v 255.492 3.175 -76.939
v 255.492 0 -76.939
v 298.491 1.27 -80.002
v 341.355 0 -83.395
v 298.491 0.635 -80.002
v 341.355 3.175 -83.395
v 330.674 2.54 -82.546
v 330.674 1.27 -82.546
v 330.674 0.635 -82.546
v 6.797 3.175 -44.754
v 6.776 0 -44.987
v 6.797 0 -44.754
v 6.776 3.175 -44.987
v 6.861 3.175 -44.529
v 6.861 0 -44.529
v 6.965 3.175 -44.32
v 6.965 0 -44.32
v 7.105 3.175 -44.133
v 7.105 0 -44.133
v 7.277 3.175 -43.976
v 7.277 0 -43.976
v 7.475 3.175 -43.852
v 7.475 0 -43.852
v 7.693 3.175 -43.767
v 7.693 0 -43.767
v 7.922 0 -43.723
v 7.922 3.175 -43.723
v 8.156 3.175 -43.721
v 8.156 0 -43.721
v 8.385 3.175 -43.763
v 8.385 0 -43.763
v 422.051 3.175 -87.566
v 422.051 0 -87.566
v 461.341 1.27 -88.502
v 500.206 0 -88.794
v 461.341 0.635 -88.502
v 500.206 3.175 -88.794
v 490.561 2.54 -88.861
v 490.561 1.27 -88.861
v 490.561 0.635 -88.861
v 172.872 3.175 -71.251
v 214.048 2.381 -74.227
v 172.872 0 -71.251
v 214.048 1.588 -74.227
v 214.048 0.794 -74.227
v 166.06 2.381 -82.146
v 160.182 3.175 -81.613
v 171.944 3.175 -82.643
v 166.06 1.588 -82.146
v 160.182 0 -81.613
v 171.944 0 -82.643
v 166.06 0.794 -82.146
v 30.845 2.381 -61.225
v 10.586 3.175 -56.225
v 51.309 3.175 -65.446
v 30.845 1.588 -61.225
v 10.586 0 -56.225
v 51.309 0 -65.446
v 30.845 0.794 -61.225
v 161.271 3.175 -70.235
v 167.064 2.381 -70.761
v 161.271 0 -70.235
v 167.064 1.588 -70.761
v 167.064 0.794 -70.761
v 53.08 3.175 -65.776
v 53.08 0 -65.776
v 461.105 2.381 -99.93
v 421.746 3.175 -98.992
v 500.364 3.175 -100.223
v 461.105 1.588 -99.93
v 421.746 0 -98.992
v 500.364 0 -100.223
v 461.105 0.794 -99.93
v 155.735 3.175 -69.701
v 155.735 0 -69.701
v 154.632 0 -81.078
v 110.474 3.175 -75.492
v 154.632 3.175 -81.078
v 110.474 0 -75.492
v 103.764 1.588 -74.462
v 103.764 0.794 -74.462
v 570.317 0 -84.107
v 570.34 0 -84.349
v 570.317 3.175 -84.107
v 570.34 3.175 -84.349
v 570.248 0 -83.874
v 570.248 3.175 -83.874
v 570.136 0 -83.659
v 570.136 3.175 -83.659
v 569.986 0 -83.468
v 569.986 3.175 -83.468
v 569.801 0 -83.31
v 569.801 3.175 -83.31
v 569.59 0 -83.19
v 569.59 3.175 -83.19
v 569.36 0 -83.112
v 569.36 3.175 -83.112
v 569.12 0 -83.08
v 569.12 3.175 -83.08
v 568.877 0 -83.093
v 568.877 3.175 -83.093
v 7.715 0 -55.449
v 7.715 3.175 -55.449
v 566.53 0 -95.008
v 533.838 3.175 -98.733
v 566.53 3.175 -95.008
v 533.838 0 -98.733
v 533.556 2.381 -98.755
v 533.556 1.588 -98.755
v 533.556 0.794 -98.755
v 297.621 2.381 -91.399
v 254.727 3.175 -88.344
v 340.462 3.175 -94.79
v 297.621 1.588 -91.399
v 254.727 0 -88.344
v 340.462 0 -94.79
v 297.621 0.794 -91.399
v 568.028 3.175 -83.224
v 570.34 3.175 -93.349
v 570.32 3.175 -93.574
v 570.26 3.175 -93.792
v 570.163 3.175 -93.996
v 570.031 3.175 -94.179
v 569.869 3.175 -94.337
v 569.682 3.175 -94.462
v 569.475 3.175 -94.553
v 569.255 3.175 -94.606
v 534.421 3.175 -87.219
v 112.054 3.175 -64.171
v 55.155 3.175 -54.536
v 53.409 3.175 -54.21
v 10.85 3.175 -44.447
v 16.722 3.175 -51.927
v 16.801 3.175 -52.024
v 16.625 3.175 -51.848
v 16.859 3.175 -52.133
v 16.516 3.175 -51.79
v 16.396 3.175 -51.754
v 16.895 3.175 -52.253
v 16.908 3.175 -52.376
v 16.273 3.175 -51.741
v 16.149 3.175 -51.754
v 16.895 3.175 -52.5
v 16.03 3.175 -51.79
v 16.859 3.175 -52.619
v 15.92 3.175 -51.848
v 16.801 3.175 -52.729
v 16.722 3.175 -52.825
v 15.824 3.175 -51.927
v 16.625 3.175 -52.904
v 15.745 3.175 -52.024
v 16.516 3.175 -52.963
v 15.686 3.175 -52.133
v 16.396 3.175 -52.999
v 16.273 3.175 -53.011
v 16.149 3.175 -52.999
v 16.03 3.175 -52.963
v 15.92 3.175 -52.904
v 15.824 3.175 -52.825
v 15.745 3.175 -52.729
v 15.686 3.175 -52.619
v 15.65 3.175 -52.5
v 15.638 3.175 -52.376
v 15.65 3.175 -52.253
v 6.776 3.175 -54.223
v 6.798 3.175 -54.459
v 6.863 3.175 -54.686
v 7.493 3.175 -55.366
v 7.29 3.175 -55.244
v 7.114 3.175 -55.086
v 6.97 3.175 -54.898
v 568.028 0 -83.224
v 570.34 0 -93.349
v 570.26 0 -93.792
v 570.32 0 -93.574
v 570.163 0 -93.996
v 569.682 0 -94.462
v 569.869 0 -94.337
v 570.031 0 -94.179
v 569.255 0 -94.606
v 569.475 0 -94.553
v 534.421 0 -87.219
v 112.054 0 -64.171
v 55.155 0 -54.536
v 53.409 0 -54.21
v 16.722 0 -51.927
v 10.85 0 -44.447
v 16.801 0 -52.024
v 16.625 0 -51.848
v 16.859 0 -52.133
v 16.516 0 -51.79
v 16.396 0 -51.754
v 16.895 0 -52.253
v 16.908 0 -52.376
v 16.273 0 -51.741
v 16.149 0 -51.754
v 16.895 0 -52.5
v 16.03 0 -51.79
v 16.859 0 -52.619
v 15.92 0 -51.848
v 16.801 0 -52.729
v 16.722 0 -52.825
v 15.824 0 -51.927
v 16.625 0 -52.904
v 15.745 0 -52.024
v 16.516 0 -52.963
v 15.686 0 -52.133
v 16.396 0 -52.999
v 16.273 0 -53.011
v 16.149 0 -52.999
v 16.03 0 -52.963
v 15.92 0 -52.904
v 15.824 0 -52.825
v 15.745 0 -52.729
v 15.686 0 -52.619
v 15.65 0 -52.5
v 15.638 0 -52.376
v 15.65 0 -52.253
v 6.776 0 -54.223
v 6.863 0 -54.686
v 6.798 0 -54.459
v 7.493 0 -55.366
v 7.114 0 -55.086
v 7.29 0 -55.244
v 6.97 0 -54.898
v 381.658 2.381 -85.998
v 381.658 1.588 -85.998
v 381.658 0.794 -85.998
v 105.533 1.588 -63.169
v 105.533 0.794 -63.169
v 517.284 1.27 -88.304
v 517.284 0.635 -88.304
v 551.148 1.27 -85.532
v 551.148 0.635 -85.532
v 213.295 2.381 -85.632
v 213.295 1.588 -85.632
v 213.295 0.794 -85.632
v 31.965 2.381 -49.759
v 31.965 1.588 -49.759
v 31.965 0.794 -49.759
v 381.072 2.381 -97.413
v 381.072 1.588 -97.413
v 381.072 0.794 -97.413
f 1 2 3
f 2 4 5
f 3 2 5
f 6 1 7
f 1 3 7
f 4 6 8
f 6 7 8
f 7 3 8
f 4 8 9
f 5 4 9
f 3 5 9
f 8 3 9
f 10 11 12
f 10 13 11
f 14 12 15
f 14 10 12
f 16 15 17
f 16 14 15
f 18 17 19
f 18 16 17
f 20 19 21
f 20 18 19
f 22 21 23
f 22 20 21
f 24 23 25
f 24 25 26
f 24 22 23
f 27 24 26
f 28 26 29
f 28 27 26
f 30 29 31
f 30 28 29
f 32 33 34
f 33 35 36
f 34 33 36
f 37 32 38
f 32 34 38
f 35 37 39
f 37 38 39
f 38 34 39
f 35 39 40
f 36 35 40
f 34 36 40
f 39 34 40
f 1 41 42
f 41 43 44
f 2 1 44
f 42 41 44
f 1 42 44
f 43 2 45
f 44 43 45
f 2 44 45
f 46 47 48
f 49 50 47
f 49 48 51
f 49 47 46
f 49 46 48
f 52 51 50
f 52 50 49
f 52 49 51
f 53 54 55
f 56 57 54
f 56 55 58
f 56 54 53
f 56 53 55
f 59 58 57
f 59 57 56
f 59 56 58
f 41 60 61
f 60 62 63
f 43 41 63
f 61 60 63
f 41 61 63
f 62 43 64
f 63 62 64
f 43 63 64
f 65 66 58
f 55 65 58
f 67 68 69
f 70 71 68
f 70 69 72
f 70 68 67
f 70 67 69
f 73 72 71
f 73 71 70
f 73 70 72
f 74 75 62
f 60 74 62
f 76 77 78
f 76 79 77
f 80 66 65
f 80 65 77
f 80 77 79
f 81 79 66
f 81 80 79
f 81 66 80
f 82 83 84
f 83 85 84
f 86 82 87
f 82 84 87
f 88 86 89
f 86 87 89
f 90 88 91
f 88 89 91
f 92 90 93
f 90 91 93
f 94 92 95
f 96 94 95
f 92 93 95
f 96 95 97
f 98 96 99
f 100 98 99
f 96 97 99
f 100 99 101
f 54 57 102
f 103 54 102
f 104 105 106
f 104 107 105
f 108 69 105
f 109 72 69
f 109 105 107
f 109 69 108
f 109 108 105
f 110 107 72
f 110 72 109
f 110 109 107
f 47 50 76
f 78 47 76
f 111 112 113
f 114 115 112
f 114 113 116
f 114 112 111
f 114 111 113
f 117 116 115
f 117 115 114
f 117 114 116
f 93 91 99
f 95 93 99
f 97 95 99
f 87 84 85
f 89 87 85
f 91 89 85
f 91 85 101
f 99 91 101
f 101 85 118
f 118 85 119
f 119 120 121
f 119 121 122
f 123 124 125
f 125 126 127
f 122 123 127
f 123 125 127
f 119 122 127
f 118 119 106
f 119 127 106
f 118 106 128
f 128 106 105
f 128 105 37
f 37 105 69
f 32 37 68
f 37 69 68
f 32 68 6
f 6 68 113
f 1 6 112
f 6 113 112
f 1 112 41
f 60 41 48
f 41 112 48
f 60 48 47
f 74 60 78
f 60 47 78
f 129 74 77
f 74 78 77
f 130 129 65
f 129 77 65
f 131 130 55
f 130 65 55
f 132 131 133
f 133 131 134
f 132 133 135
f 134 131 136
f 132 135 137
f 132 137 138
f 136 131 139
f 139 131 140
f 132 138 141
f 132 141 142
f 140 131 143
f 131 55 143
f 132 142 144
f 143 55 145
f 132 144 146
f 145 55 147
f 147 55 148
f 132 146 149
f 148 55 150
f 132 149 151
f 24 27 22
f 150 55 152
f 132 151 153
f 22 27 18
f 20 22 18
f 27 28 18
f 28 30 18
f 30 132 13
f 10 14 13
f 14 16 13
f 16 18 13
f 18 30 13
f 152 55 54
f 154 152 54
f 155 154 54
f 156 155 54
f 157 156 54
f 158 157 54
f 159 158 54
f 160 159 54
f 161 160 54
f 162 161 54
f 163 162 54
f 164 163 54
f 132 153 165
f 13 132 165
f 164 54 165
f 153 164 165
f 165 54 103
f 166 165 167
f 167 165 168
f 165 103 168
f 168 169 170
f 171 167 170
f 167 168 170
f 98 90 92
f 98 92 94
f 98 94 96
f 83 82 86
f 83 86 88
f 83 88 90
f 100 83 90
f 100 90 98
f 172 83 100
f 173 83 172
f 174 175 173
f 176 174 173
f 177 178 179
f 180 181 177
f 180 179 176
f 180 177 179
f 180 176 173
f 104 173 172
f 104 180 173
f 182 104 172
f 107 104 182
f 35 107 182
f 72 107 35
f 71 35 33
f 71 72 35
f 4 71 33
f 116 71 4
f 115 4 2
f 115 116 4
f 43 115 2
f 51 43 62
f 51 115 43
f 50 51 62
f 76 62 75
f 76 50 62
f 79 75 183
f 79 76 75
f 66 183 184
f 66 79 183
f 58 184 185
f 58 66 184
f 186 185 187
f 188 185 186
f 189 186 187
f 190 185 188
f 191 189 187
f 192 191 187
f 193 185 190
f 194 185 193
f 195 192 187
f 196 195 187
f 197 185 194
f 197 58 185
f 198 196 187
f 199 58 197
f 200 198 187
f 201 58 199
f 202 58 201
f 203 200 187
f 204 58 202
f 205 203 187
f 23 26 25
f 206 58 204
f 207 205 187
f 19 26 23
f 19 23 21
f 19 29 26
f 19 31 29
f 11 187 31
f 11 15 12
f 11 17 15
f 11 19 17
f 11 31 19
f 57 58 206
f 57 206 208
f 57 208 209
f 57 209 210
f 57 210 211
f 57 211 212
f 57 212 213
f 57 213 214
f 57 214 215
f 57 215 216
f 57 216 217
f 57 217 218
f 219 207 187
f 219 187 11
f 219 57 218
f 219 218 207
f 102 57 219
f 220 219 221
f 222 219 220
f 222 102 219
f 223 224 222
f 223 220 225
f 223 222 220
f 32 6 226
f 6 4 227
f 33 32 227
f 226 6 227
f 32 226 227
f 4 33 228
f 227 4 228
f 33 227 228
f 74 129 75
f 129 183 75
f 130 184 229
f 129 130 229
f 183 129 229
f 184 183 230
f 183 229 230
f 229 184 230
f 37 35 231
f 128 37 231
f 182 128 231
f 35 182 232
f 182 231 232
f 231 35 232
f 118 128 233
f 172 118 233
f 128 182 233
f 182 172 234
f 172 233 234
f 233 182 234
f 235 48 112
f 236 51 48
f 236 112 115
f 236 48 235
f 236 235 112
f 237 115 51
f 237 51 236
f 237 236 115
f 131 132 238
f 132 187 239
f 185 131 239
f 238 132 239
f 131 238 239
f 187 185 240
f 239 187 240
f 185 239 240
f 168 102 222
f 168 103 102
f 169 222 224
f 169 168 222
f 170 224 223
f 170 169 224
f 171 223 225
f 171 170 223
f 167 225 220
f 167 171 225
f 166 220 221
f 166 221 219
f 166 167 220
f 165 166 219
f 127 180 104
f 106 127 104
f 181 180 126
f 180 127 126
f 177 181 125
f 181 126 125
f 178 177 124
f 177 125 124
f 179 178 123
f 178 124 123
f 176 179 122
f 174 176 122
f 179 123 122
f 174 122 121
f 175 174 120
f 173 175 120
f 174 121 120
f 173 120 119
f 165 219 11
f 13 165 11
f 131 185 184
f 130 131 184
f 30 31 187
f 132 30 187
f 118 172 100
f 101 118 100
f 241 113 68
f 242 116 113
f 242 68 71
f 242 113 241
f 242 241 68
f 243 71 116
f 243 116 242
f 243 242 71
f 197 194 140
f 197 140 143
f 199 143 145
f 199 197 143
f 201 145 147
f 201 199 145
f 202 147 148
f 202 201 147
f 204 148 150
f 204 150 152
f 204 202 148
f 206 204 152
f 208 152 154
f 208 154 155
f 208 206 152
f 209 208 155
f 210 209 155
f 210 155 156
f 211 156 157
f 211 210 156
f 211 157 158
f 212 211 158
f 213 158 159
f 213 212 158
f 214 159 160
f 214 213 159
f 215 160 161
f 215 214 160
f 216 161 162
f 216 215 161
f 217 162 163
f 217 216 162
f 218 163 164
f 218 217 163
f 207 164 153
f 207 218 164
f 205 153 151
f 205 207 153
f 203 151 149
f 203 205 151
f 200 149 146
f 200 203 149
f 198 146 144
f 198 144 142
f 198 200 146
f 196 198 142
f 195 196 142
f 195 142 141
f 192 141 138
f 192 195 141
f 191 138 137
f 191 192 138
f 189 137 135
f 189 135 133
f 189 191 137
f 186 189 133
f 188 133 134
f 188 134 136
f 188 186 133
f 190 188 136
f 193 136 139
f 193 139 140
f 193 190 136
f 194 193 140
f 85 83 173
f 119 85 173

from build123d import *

# Parameters (mm, degrees)
BOSS_EXTRUDE1_OUTLINE_R = 0.635
BOSS_EXTRUDE1_DEPTH     = 3.175
FILLET1_R               = 1.27


with BuildPart() as part:
    # Boss-Extrude1: read off the stored shape, not the designer's step
    # Boss-Extrude1 outline → Boss-Extrude1 (new body)
    with BuildSketch(Plane(origin=(0, 0, 0), x_dir=(1, 0, 0), z_dir=(0, 1, 0))):
        with BuildLine():
            add(Edge.make_bspline(
                [(500.363931332, 100.223117218), (505.904690625, 100.146488345), (516.98978709, 99.849867286), (533.566493845, 98.855153949), (550.078420692, 97.261234107), (561.055884951, 95.814370924), (566.530123356, 95.007503377)],
                knots=[0, 0, 0, 0, 0.238282839, 0.476565677, 0.714848516, 0.953131355, 0.953131355, 0.953131355, 0.953131355], degree=3))
            add(Edge.make_bspline(
                [(421.745937115, 98.991738452), (428.305748156, 99.166301643), (441.425519501, 99.487460571), (461.109158457, 99.948027433), (480.768480262, 100.297767803), (493.828917925, 100.313504897), (500.363931332, 100.223117218)],
                knots=[2.683e-06, 2.683e-06, 2.683e-06, 2.683e-06, 0.250002012, 0.500001342, 0.750000671, 1, 1, 1, 1], degree=3))
            add(Edge.make_bspline(
                [(340.462462002, 94.7897299), (347.224032201, 95.319027204), (360.754286882, 96.282918846), (381.069871528, 97.456302869), (401.400886655, 98.368636041), (414.96379764, 98.810505185), (421.745937115, 98.991738452)],
                knots=[3.435e-06, 3.435e-06, 3.435e-06, 3.435e-06, 0.250001928, 0.50000042, 0.749998913, 0.999997406, 0.999997406, 0.999997406, 0.999997406], degree=3))
            add(Edge.make_bspline(
                [(254.727325479, 88.343859808), (261.87746665, 88.823336878), (276.174869396, 89.799016416), (297.623416106, 91.380630717), (319.058656024, 93.072402004), (333.325074716, 94.22995733), (340.462462002, 94.7897299)],
                knots=[9.51e-07, 9.51e-07, 9.51e-07, 9.51e-07, 0.249999898, 0.499998846, 0.749997793, 0.999996741, 0.999996741, 0.999996741, 0.999996741], degree=3))
            add(Edge.make_bspline(
                [(171.943647819, 82.643083752), (178.827869401, 83.20387), (192.598901149, 84.242258738), (213.291619829, 85.642783935), (234.001733829, 86.980350184), (247.820432283, 87.880397005), (254.727325479, 88.343859808)],
                knots=[-1.79e-07, -1.79e-07, -1.79e-07, -1.79e-07, 0.24999962, 0.499999418, 0.749999217, 0.999999016, 0.999999016, 0.999999016, 0.999999016], degree=3))
            add(Edge.make_bspline(
                [(160.182050495, 81.61265481), (161.161257266, 81.70495935), (163.119828179, 81.886084692), (166.059605792, 82.147991178), (169.000722356, 82.400596631), (170.962655848, 82.563180216), (171.943647819, 82.643083752)],
                knots=[1.061e-06, 1.061e-06, 1.061e-06, 1.061e-06, 0.25000111, 0.500001159, 0.750001208, 1.000001256, 1.000001256, 1.000001256, 1.000001256], degree=3))
            Line((160.182050495, 81.61265481), (154.632395026, 81.077586961))
            add(Edge.make_bspline(
                [(53.079998289, 65.775715516), (61.513898232, 67.319009556), (78.399927581, 70.329047536), (103.756484767, 74.544619134), (129.160124243, 78.262769864), (146.128753825, 80.24430394), (154.632395026, 81.077586961)],
                knots=[5.8856e-05, 5.8856e-05, 5.8856e-05, 5.8856e-05, 0.250044142, 0.500029428, 0.750014714, 1, 1, 1, 1], degree=3))
            Line((53.079998289, 65.775715516), (51.308549202, 65.445740225))
            add(Edge.make_bspline(
                [(10.585897899, 56.224984318), (13.941779162, 57.132062519), (20.672458821, 58.866248382), (30.837264924, 61.257343807), (41.047425931, 63.455573181), (47.885214569, 64.801138415), (51.308549202, 65.445740225)],
                knots=[0.064907657, 0.064907657, 0.064907657, 0.064907657, 0.298680743, 0.532453828, 0.766226914, 1, 1, 1, 1], degree=3))
            Line((10.585897899, 56.224984318), (6.775897899, 55.195160056))
            Line((6.775897899, 55.195160056), (6.775897899, 43.316199984))
            Line((6.775897899, 43.316199984), (10.850234699, 44.446598793))
            add(Edge.make_bspline(
                [(10.850234699, 44.446598793), (14.340342636, 45.414907022), (21.334985759, 47.258123006), (31.953816099, 49.794941322), (42.64150526, 52.117473464), (49.81793576, 53.534111605), (53.409096635, 54.210402111)],
                knots=[0, 0, 0, 0, 0.24991594, 0.499831881, 0.749747821, 0.999663762, 0.999663762, 0.999663762, 0.999663762], degree=3))
            Line((53.409096635, 54.210402111), (55.155253114, 54.535673302))
            add(Edge.make_bspline(
                [(55.155253114, 54.535673302), (63.54774086, 56.071332867), (80.36299007, 59.06858723), (105.540389435, 63.254049355), (130.671339907, 66.93119705), (147.359801836, 68.880042413), (155.735311702, 69.700917089)],
                knots=[0.000236149, 0.000236149, 0.000236149, 0.000236149, 0.250147744, 0.500059338, 0.749970932, 0.999882527, 0.999882527, 0.999882527, 0.999882527], degree=3))
            Line((155.735311702, 69.700917089), (161.270823741, 70.234617305))
            add(Edge.make_bspline(
                [(161.270823741, 70.234617305), (162.235608998, 70.325543269), (164.164816506, 70.503921062), (167.063624178, 70.762146818), (169.965303116, 71.011348444), (171.902999143, 71.171919977), (172.87161313, 71.250815305)],
                knots=[0.001389066, 0.001389066, 0.001389066, 0.001389066, 0.251043056, 0.500697046, 0.750351036, 1.000005026, 1.000005026, 1.000005026, 1.000005026], degree=3))
            add(Edge.make_bspline(
                [(172.87161313, 71.250815305), (179.718410582, 71.808552996), (193.402049653, 72.840364183), (214.038683352, 74.237228358), (234.732110585, 75.573699755), (248.577004917, 76.475460963), (255.492330083, 76.939489241)],
                knots=[-7.18e-07, -7.18e-07, -7.18e-07, -7.18e-07, 0.24999848, 0.499997678, 0.749996876, 0.999996073, 0.999996073, 0.999996073, 0.999996073], degree=3))
            add(Edge.make_bspline(
                [(255.492330083, 76.939489241), (262.657227476, 77.419956035), (276.977734346, 78.397215401), (298.499351954, 79.984114865), (316.393020167, 81.39668078), (330.682169872, 82.547590749), (337.794627544, 83.115396626), (341.355313187, 83.394655636)],
                knots=[3.799e-06, 3.799e-06, 3.799e-06, 3.799e-06, 0.249999576, 0.499995354, 0.749991131, 0.87498902, 0.999986909, 0.999986909, 0.999986909, 0.999986909], degree=3))
            add(Edge.make_bspline(
                [(341.355313187, 83.394655636), (348.06466872, 83.919861633), (361.488791434, 84.876192049), (381.654909862, 86.040969048), (401.841290064, 86.946839421), (415.314276027, 87.385788047), (422.050628462, 87.565800259)],
                knots=[1.3832e-05, 1.3832e-05, 1.3832e-05, 1.3832e-05, 0.250007766, 0.5000017, 0.749995634, 0.999989568, 0.999989568, 0.999989568, 0.999989568], degree=3))
            add(Edge.make_bspline(
                [(422.050628462, 87.565800259), (428.600174065, 87.740089377), (441.696238314, 88.060664748), (461.363367324, 88.520823712), (477.64061994, 88.810121246), (490.573430891, 88.879422902), (496.991230944, 88.838672768), (500.205859595, 88.7942103)],
                knots=[1.0774e-05, 1.0774e-05, 1.0774e-05, 1.0774e-05, 0.250008111, 0.500005448, 0.750002785, 0.875001454, 1.000000122, 1.000000122, 1.000000122, 1.000000122], degree=3))
            add(Edge.make_bspline(
                [(500.205859595, 88.7942103), (503.058403259, 88.754759533), (508.771360909, 88.63685492), (520.125839257, 88.225760782), (534.266224295, 87.340206173), (551.142590634, 85.635354683), (562.414974362, 84.084969045), (568.028462482, 83.22352623)],
                knots=[-1.37e-07, -1.37e-07, -1.37e-07, -1.37e-07, 0.12499988, 0.249999898, 0.499999932, 0.749999966, 1, 1, 1, 1], degree=3))
            Line((568.028462482, 83.22352623), (570.340123356, 82.868780018))
            Line((570.340123356, 82.868780018), (570.340123356, 94.445933872))
            Line((570.340123356, 94.445933872), (566.530123356, 95.007503377))
        make_face()
        with Locations((16.272596326, 52.376396822)):
            Circle(BOSS_EXTRUDE1_OUTLINE_R, mode=Mode.SUBTRACT)
    extrude(amount=BOSS_EXTRUDE1_DEPTH)

    # Fillet1
    fillet1_edges = [part.edges().sort_by_distance(p)[0] for p in [
        (570.340123356, 1.5875, -94.445933872),
        (570.340123356, 1.5875, -82.868780018),
        (6.775897899, 1.5875, -43.316199984),
        (6.775897899, 1.5875, -55.195160056),
    ]]
    fillet(fillet1_edges, radius=FILLET1_R)


solid = part.part
